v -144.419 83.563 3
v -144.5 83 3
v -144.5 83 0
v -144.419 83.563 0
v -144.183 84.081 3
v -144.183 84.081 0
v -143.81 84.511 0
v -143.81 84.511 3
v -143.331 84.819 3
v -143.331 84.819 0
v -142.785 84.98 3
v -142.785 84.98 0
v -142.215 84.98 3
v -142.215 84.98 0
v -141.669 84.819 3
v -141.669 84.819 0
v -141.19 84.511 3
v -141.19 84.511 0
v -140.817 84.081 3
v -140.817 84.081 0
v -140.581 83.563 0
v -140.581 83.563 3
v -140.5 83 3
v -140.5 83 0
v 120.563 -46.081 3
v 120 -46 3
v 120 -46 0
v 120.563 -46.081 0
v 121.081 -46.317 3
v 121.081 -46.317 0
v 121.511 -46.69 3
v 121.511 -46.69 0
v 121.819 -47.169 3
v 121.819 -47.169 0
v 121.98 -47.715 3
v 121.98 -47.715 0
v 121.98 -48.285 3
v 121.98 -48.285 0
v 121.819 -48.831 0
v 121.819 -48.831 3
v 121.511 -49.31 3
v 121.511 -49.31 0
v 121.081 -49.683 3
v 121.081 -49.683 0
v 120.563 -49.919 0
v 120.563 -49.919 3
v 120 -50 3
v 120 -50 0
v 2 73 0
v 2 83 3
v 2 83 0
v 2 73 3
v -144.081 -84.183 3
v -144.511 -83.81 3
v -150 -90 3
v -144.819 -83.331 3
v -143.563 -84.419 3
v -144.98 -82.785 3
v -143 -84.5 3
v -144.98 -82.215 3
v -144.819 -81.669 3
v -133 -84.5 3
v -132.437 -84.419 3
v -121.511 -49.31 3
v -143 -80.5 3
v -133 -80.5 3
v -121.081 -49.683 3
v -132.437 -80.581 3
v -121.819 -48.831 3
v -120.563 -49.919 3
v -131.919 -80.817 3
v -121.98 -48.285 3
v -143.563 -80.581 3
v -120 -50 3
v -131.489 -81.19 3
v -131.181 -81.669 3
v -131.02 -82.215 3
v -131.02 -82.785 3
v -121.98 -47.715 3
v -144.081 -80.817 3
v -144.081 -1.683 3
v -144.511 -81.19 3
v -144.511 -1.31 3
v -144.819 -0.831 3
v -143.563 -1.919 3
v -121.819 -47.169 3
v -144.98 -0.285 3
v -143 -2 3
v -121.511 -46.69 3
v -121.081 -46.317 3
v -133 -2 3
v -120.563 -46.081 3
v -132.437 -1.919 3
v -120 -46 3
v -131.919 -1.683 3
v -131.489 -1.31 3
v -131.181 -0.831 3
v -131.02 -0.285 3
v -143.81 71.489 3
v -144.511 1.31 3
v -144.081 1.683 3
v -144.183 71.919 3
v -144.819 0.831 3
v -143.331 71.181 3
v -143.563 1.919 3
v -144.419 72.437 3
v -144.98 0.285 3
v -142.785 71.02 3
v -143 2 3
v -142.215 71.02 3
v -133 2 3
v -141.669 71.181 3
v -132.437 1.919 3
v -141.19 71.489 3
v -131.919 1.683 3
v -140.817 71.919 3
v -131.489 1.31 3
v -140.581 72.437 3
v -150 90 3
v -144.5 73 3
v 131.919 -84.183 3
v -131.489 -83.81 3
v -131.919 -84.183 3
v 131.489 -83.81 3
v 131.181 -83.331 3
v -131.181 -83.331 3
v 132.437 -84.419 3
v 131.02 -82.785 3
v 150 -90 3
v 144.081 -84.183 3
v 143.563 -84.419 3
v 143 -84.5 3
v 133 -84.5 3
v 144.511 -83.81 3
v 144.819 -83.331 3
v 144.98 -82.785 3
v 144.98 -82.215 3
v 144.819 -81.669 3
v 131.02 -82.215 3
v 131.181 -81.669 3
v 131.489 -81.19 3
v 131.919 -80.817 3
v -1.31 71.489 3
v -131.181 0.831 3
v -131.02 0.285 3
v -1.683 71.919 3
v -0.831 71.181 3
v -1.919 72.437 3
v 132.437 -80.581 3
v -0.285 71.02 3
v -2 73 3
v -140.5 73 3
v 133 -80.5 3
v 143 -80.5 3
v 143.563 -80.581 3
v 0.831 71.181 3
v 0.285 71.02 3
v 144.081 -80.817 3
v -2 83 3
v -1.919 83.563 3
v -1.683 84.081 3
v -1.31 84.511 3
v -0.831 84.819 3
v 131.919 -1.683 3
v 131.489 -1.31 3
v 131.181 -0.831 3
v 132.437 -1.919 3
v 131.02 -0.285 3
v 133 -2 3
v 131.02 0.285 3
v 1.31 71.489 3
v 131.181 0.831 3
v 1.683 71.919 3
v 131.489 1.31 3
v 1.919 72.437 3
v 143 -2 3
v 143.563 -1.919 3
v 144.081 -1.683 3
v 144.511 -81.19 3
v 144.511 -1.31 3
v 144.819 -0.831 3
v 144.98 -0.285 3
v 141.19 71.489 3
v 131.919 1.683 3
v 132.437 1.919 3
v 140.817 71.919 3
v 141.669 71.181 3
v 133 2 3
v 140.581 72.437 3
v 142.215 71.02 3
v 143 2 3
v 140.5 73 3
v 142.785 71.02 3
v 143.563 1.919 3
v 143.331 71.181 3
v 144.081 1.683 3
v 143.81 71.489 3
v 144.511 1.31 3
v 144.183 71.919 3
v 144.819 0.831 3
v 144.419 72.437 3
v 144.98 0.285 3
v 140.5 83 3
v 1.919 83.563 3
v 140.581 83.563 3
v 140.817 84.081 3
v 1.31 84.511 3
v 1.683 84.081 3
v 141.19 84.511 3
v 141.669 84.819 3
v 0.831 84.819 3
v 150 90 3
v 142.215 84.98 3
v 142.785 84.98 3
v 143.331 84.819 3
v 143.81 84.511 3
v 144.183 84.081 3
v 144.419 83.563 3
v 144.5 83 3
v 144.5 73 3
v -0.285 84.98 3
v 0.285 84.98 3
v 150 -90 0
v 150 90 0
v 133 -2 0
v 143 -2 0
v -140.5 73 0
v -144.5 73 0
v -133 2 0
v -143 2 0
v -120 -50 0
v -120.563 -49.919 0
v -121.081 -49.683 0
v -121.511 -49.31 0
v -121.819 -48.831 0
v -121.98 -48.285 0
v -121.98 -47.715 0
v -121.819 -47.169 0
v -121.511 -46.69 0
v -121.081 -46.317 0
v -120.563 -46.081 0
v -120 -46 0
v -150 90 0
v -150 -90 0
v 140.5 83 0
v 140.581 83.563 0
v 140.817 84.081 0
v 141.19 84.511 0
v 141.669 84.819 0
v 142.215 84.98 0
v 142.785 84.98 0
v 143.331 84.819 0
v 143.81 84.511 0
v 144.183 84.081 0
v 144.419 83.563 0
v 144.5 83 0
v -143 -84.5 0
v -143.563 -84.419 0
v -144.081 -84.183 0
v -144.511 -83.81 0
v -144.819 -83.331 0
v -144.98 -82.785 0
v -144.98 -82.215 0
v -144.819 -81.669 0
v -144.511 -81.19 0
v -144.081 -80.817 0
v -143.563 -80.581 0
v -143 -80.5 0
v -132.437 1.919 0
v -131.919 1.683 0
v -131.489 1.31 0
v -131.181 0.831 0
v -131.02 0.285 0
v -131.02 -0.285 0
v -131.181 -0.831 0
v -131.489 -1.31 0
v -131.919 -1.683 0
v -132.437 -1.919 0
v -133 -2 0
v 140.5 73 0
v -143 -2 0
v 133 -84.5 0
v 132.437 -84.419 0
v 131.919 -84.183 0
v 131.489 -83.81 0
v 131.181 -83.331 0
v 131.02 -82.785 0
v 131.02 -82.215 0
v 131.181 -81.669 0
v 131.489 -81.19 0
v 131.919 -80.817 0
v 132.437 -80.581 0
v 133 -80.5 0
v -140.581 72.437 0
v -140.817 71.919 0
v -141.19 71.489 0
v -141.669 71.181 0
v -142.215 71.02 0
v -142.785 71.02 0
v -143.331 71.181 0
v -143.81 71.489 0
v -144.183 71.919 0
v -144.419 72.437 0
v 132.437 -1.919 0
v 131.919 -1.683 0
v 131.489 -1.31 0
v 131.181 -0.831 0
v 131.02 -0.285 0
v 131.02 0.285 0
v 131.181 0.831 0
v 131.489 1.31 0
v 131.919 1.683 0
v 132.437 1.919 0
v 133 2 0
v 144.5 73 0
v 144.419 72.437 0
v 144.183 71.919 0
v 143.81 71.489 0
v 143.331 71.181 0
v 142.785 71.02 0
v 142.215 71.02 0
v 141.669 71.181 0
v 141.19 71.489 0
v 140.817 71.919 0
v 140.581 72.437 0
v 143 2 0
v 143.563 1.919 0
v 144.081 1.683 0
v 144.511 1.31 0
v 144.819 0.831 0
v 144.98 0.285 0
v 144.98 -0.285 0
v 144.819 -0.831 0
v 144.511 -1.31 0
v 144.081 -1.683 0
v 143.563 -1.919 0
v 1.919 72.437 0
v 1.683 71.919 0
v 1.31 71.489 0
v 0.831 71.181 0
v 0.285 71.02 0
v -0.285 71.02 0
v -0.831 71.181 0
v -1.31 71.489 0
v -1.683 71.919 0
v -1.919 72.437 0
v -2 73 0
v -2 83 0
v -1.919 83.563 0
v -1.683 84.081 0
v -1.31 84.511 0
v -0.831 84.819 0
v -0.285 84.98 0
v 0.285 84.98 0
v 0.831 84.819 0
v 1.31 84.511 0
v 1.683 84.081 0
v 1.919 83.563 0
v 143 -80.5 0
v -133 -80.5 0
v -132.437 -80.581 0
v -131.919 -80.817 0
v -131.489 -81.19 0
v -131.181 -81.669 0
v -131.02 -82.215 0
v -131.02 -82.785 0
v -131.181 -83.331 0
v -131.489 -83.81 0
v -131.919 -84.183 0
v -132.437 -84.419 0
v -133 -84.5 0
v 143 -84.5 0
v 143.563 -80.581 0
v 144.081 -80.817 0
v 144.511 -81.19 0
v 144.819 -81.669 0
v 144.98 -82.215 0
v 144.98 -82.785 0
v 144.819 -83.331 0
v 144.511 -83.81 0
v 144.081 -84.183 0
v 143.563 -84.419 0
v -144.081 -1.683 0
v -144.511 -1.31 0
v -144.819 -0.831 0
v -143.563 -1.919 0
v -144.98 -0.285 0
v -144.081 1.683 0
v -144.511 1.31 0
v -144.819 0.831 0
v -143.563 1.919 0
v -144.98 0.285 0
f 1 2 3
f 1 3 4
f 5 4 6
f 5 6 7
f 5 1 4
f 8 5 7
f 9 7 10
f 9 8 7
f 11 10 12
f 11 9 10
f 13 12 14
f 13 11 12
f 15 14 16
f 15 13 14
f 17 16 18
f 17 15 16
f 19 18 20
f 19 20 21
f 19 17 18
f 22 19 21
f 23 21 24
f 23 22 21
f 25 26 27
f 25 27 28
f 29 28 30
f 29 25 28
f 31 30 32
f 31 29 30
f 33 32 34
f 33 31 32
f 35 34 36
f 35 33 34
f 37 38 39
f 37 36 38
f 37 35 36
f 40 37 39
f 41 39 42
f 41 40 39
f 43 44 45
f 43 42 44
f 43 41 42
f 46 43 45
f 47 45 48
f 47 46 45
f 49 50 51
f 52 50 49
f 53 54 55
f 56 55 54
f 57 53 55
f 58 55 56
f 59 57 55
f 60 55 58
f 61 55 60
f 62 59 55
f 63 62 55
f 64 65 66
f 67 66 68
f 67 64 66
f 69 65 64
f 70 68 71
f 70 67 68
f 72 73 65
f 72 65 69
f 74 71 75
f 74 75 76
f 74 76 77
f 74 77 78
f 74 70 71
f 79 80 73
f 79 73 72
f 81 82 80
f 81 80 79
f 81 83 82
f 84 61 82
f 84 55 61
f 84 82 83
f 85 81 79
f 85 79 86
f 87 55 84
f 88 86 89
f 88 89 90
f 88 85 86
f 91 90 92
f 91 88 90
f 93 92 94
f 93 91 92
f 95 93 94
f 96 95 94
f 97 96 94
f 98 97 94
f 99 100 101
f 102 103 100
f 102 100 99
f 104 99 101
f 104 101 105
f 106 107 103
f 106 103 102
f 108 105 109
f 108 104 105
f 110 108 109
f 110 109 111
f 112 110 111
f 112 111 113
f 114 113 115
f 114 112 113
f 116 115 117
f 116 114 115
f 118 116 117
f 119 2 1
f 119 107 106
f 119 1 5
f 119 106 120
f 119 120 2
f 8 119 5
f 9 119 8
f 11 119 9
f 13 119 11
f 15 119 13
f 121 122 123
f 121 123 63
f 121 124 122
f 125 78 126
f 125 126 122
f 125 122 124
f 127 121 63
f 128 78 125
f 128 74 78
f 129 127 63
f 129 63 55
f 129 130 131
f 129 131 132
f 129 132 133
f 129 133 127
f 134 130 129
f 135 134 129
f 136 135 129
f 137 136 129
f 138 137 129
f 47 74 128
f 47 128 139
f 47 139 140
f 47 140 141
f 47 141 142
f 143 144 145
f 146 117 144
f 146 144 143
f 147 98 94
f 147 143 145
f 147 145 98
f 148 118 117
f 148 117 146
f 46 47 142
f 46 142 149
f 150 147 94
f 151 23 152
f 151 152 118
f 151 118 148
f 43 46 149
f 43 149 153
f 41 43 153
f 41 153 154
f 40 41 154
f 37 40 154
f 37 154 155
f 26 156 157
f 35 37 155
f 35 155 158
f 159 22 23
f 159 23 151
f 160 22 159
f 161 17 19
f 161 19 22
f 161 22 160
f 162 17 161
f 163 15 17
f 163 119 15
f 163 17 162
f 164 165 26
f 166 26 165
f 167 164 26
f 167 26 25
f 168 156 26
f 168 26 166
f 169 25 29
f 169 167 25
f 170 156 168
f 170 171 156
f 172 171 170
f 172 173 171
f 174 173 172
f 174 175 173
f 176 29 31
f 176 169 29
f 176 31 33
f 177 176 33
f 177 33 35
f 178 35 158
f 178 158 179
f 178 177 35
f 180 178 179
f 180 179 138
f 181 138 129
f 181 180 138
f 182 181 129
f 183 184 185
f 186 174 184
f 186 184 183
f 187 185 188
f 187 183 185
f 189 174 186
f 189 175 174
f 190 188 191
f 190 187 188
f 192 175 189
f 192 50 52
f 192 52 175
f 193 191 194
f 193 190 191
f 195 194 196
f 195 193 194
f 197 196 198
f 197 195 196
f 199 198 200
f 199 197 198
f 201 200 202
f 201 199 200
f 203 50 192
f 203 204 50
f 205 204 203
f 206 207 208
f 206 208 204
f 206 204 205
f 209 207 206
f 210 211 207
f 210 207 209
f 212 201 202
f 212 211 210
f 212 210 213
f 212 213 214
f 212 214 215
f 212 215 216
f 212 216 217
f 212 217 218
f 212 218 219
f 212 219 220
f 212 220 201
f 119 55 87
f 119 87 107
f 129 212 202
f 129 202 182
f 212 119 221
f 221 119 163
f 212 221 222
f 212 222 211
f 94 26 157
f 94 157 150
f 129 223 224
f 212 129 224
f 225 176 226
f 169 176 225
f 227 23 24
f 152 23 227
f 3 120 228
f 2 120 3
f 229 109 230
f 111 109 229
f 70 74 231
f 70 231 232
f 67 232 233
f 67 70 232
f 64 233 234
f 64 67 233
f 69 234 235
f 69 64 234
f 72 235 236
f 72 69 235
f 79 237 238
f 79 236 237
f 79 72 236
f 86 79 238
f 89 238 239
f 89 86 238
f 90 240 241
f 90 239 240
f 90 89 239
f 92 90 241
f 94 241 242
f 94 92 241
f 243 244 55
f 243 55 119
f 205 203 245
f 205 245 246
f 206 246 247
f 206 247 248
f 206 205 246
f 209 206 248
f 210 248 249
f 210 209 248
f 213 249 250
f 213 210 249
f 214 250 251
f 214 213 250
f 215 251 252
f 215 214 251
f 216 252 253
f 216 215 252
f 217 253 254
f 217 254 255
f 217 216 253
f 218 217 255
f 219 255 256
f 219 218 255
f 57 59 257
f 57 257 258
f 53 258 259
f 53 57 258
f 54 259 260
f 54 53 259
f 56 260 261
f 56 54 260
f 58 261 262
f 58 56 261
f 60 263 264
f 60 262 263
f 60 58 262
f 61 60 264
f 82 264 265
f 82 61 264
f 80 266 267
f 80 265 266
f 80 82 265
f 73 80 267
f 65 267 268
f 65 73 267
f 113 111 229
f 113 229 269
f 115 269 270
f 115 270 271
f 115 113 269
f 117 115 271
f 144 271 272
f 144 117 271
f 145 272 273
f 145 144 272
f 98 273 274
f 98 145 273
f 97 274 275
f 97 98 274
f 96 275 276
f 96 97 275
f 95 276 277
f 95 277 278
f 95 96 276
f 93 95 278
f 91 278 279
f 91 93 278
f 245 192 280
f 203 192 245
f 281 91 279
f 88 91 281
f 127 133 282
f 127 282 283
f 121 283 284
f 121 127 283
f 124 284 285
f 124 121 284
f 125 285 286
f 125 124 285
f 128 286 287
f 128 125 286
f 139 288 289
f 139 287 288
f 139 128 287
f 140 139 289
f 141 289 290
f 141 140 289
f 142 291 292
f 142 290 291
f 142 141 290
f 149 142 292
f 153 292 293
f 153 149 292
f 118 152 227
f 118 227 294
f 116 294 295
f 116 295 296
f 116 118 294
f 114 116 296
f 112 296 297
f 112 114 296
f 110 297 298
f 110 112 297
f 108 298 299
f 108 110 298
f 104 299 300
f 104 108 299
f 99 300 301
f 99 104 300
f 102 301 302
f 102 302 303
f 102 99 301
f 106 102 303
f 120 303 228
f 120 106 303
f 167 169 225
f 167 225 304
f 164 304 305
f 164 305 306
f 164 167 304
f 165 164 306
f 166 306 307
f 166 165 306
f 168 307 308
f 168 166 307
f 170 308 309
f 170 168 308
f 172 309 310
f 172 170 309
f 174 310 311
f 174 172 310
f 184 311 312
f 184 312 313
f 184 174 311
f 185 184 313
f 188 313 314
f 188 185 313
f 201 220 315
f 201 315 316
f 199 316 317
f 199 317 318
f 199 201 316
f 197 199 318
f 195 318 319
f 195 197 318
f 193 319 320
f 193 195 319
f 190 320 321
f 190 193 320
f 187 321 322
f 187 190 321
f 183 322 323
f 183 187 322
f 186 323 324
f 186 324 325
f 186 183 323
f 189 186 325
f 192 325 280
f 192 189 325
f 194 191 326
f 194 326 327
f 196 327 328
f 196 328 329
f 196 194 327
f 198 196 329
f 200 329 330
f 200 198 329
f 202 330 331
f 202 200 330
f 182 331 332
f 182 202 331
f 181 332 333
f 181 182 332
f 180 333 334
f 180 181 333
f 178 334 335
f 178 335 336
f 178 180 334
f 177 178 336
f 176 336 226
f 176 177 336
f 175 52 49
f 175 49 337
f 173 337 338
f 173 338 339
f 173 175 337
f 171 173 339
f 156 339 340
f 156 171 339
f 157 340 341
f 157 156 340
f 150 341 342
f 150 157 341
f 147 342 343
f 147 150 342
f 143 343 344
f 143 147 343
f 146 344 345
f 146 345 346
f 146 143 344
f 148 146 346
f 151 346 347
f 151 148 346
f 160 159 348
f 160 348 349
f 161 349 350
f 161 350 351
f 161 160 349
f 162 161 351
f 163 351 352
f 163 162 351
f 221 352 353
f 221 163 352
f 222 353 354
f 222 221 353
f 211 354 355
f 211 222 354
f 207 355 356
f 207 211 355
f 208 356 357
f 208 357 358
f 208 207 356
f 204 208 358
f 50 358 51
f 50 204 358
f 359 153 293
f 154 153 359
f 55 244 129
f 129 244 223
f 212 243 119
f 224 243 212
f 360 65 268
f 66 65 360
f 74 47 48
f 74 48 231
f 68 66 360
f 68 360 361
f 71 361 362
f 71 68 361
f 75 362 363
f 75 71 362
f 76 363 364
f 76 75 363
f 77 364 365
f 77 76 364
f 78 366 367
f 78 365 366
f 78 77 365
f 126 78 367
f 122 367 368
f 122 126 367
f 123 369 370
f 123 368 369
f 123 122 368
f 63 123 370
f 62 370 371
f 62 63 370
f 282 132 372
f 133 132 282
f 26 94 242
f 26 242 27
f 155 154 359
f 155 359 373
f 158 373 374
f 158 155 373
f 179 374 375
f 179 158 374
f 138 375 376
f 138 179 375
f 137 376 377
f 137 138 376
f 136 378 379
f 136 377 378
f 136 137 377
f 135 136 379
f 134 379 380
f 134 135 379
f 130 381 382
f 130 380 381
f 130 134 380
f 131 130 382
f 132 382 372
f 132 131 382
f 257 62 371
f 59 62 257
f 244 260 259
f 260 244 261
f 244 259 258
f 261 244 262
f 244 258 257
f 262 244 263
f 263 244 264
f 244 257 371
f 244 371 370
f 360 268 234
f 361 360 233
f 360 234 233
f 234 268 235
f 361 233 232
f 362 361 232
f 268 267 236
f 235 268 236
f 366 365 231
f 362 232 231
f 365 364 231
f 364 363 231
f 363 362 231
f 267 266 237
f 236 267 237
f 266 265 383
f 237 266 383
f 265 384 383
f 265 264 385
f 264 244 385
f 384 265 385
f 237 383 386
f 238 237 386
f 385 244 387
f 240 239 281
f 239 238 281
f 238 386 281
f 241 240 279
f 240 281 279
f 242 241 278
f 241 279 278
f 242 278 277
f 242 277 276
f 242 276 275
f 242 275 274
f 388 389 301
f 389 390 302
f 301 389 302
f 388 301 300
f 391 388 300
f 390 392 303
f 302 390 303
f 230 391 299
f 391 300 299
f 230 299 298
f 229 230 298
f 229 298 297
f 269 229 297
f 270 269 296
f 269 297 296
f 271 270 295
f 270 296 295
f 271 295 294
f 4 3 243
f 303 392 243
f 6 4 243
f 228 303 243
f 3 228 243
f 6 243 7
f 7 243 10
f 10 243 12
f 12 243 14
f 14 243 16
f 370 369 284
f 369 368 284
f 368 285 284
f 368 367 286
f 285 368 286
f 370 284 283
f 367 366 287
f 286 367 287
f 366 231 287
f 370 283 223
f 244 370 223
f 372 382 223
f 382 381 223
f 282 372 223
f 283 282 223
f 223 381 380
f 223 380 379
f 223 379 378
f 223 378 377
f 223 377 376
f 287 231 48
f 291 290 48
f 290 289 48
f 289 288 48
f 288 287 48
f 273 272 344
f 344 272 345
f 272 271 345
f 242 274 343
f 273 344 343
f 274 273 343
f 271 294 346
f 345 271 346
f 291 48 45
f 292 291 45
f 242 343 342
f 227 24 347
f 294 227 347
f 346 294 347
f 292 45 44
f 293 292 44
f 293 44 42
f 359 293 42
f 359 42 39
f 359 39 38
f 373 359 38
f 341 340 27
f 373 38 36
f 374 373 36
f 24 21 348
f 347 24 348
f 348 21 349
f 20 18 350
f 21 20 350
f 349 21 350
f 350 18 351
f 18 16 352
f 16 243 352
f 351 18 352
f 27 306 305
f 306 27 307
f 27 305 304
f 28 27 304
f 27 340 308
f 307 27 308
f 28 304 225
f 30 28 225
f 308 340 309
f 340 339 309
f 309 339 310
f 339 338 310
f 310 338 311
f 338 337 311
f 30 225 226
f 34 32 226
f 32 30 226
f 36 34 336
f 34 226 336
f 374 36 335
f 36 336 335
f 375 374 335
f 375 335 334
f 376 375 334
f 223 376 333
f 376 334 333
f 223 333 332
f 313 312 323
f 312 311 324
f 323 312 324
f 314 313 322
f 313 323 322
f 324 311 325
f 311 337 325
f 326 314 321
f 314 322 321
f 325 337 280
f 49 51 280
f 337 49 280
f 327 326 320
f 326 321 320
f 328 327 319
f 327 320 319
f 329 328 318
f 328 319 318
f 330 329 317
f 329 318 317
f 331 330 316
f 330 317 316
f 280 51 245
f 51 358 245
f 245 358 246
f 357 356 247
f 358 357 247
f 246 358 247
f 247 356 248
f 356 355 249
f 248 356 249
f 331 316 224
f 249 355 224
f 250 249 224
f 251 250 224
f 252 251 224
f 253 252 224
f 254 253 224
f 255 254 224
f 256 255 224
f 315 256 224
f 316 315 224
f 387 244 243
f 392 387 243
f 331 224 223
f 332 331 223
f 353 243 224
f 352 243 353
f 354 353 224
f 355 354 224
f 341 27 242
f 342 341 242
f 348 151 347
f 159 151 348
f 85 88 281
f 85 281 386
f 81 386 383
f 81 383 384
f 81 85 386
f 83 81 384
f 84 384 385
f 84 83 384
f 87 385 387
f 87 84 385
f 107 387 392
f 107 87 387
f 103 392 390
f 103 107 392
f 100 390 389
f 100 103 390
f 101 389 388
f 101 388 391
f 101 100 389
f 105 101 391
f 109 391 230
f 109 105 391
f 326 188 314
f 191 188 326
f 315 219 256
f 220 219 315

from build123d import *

# Parameters (mm, degrees)
SKETCH3_W           = 300
SKETCH3_H           = 180
BOSS_EXTRUDE2_DEPTH = 3
CUT_EXTRUDE1_DEPTH  = 3
CUT_EXTRUDE2_DEPTH  = 3
CUT_EXTRUDE3_DEPTH  = 10
CUT_EXTRUDE4_DEPTH  = 10
CUT_EXTRUDE5_DEPTH  = 10


with BuildPart() as part:
    # Sketch3 → Boss-Extrude2 (new body)
    with BuildSketch(Plane.XY):
        Rectangle(SKETCH3_W, SKETCH3_H)
    extrude(amount=BOSS_EXTRUDE2_DEPTH)

    # Sketch4 → Cut-Extrude1 (cut)
    with BuildSketch(Plane.XY.offset(3)):
        with BuildLine():
            Line((-140.5, 83), (-140.5, 73))
            ThreePointArc((-140.5, 73), (-142.5, 71), (-144.5, 73))
            Line((-144.5, 73), (-144.5, 83))
            ThreePointArc((-144.5, 83), (-142.5, 85), (-140.5, 83))
        make_face()
        with BuildLine():
            Line((2, 83), (2, 73))
            ThreePointArc((2, 73), (0, 71), (-2, 73))
            Line((-2, 73), (-2, 83))
            ThreePointArc((-2, 83), (0, 85), (2, 83))
        make_face()
        with BuildLine():
            Line((144.5, 83), (144.5, 73))
            ThreePointArc((144.5, 73), (142.5, 71), (140.5, 73))
            Line((140.5, 73), (140.5, 83))
            ThreePointArc((140.5, 83), (142.5, 85), (144.5, 83))
        make_face()
    extrude(amount=-CUT_EXTRUDE1_DEPTH, mode=Mode.SUBTRACT)

    # Sketch5 → Cut-Extrude2 (cut)
    with BuildSketch(Plane.XY.offset(3)):
        with BuildLine():
            Line((-143, 2), (-133, 2))
            ThreePointArc((-133, 2), (-131, 0), (-133, -2))
            Line((-133, -2), (-143, -2))
            ThreePointArc((-143, -2), (-145, 0), (-143, 2))
        make_face()
        with BuildLine():
            Line((133, 2), (143, 2))
            ThreePointArc((143, 2), (145, 0), (143, -2))
            Line((143, -2), (133, -2))
            ThreePointArc((133, -2), (131, 0), (133, 2))
        make_face()
    extrude(amount=-CUT_EXTRUDE2_DEPTH, mode=Mode.SUBTRACT)

    # Sketch6 → Cut-Extrude3 (cut)
    with BuildSketch(Plane.XY.offset(3)):
        with BuildLine():
            Line((143, -84.5), (133, -84.5))
            ThreePointArc((133, -84.5), (131, -82.5), (133, -80.5))
            Line((133, -80.5), (143, -80.5))
            ThreePointArc((143, -80.5), (145, -82.5), (143, -84.5))
        make_face()
    extrude(amount=-CUT_EXTRUDE3_DEPTH, mode=Mode.SUBTRACT)

    # Sketch7 → Cut-Extrude4 (cut)
    with BuildSketch(Plane.XY.offset(3)):
        with BuildLine():
            Line((-143, -80.5), (-133, -80.5))
            ThreePointArc((-133, -80.5), (-131, -82.5), (-133, -84.5))
            Line((-133, -84.5), (-143, -84.5))
            ThreePointArc((-143, -84.5), (-145, -82.5), (-143, -80.5))
        make_face()
    extrude(amount=-CUT_EXTRUDE4_DEPTH, mode=Mode.SUBTRACT)

    # Sketch8 → Cut-Extrude5 (cut)
    with BuildSketch(Plane.XY.offset(3)):
        with BuildLine():
            Line((-120, -46), (120, -46))
            ThreePointArc((120, -46), (122, -48), (120, -50))
            Line((120, -50), (-120, -50))
            ThreePointArc((-120, -50), (-122, -48), (-120, -46))
        make_face()
    extrude(amount=-CUT_EXTRUDE5_DEPTH, mode=Mode.SUBTRACT)


solid = part.part
